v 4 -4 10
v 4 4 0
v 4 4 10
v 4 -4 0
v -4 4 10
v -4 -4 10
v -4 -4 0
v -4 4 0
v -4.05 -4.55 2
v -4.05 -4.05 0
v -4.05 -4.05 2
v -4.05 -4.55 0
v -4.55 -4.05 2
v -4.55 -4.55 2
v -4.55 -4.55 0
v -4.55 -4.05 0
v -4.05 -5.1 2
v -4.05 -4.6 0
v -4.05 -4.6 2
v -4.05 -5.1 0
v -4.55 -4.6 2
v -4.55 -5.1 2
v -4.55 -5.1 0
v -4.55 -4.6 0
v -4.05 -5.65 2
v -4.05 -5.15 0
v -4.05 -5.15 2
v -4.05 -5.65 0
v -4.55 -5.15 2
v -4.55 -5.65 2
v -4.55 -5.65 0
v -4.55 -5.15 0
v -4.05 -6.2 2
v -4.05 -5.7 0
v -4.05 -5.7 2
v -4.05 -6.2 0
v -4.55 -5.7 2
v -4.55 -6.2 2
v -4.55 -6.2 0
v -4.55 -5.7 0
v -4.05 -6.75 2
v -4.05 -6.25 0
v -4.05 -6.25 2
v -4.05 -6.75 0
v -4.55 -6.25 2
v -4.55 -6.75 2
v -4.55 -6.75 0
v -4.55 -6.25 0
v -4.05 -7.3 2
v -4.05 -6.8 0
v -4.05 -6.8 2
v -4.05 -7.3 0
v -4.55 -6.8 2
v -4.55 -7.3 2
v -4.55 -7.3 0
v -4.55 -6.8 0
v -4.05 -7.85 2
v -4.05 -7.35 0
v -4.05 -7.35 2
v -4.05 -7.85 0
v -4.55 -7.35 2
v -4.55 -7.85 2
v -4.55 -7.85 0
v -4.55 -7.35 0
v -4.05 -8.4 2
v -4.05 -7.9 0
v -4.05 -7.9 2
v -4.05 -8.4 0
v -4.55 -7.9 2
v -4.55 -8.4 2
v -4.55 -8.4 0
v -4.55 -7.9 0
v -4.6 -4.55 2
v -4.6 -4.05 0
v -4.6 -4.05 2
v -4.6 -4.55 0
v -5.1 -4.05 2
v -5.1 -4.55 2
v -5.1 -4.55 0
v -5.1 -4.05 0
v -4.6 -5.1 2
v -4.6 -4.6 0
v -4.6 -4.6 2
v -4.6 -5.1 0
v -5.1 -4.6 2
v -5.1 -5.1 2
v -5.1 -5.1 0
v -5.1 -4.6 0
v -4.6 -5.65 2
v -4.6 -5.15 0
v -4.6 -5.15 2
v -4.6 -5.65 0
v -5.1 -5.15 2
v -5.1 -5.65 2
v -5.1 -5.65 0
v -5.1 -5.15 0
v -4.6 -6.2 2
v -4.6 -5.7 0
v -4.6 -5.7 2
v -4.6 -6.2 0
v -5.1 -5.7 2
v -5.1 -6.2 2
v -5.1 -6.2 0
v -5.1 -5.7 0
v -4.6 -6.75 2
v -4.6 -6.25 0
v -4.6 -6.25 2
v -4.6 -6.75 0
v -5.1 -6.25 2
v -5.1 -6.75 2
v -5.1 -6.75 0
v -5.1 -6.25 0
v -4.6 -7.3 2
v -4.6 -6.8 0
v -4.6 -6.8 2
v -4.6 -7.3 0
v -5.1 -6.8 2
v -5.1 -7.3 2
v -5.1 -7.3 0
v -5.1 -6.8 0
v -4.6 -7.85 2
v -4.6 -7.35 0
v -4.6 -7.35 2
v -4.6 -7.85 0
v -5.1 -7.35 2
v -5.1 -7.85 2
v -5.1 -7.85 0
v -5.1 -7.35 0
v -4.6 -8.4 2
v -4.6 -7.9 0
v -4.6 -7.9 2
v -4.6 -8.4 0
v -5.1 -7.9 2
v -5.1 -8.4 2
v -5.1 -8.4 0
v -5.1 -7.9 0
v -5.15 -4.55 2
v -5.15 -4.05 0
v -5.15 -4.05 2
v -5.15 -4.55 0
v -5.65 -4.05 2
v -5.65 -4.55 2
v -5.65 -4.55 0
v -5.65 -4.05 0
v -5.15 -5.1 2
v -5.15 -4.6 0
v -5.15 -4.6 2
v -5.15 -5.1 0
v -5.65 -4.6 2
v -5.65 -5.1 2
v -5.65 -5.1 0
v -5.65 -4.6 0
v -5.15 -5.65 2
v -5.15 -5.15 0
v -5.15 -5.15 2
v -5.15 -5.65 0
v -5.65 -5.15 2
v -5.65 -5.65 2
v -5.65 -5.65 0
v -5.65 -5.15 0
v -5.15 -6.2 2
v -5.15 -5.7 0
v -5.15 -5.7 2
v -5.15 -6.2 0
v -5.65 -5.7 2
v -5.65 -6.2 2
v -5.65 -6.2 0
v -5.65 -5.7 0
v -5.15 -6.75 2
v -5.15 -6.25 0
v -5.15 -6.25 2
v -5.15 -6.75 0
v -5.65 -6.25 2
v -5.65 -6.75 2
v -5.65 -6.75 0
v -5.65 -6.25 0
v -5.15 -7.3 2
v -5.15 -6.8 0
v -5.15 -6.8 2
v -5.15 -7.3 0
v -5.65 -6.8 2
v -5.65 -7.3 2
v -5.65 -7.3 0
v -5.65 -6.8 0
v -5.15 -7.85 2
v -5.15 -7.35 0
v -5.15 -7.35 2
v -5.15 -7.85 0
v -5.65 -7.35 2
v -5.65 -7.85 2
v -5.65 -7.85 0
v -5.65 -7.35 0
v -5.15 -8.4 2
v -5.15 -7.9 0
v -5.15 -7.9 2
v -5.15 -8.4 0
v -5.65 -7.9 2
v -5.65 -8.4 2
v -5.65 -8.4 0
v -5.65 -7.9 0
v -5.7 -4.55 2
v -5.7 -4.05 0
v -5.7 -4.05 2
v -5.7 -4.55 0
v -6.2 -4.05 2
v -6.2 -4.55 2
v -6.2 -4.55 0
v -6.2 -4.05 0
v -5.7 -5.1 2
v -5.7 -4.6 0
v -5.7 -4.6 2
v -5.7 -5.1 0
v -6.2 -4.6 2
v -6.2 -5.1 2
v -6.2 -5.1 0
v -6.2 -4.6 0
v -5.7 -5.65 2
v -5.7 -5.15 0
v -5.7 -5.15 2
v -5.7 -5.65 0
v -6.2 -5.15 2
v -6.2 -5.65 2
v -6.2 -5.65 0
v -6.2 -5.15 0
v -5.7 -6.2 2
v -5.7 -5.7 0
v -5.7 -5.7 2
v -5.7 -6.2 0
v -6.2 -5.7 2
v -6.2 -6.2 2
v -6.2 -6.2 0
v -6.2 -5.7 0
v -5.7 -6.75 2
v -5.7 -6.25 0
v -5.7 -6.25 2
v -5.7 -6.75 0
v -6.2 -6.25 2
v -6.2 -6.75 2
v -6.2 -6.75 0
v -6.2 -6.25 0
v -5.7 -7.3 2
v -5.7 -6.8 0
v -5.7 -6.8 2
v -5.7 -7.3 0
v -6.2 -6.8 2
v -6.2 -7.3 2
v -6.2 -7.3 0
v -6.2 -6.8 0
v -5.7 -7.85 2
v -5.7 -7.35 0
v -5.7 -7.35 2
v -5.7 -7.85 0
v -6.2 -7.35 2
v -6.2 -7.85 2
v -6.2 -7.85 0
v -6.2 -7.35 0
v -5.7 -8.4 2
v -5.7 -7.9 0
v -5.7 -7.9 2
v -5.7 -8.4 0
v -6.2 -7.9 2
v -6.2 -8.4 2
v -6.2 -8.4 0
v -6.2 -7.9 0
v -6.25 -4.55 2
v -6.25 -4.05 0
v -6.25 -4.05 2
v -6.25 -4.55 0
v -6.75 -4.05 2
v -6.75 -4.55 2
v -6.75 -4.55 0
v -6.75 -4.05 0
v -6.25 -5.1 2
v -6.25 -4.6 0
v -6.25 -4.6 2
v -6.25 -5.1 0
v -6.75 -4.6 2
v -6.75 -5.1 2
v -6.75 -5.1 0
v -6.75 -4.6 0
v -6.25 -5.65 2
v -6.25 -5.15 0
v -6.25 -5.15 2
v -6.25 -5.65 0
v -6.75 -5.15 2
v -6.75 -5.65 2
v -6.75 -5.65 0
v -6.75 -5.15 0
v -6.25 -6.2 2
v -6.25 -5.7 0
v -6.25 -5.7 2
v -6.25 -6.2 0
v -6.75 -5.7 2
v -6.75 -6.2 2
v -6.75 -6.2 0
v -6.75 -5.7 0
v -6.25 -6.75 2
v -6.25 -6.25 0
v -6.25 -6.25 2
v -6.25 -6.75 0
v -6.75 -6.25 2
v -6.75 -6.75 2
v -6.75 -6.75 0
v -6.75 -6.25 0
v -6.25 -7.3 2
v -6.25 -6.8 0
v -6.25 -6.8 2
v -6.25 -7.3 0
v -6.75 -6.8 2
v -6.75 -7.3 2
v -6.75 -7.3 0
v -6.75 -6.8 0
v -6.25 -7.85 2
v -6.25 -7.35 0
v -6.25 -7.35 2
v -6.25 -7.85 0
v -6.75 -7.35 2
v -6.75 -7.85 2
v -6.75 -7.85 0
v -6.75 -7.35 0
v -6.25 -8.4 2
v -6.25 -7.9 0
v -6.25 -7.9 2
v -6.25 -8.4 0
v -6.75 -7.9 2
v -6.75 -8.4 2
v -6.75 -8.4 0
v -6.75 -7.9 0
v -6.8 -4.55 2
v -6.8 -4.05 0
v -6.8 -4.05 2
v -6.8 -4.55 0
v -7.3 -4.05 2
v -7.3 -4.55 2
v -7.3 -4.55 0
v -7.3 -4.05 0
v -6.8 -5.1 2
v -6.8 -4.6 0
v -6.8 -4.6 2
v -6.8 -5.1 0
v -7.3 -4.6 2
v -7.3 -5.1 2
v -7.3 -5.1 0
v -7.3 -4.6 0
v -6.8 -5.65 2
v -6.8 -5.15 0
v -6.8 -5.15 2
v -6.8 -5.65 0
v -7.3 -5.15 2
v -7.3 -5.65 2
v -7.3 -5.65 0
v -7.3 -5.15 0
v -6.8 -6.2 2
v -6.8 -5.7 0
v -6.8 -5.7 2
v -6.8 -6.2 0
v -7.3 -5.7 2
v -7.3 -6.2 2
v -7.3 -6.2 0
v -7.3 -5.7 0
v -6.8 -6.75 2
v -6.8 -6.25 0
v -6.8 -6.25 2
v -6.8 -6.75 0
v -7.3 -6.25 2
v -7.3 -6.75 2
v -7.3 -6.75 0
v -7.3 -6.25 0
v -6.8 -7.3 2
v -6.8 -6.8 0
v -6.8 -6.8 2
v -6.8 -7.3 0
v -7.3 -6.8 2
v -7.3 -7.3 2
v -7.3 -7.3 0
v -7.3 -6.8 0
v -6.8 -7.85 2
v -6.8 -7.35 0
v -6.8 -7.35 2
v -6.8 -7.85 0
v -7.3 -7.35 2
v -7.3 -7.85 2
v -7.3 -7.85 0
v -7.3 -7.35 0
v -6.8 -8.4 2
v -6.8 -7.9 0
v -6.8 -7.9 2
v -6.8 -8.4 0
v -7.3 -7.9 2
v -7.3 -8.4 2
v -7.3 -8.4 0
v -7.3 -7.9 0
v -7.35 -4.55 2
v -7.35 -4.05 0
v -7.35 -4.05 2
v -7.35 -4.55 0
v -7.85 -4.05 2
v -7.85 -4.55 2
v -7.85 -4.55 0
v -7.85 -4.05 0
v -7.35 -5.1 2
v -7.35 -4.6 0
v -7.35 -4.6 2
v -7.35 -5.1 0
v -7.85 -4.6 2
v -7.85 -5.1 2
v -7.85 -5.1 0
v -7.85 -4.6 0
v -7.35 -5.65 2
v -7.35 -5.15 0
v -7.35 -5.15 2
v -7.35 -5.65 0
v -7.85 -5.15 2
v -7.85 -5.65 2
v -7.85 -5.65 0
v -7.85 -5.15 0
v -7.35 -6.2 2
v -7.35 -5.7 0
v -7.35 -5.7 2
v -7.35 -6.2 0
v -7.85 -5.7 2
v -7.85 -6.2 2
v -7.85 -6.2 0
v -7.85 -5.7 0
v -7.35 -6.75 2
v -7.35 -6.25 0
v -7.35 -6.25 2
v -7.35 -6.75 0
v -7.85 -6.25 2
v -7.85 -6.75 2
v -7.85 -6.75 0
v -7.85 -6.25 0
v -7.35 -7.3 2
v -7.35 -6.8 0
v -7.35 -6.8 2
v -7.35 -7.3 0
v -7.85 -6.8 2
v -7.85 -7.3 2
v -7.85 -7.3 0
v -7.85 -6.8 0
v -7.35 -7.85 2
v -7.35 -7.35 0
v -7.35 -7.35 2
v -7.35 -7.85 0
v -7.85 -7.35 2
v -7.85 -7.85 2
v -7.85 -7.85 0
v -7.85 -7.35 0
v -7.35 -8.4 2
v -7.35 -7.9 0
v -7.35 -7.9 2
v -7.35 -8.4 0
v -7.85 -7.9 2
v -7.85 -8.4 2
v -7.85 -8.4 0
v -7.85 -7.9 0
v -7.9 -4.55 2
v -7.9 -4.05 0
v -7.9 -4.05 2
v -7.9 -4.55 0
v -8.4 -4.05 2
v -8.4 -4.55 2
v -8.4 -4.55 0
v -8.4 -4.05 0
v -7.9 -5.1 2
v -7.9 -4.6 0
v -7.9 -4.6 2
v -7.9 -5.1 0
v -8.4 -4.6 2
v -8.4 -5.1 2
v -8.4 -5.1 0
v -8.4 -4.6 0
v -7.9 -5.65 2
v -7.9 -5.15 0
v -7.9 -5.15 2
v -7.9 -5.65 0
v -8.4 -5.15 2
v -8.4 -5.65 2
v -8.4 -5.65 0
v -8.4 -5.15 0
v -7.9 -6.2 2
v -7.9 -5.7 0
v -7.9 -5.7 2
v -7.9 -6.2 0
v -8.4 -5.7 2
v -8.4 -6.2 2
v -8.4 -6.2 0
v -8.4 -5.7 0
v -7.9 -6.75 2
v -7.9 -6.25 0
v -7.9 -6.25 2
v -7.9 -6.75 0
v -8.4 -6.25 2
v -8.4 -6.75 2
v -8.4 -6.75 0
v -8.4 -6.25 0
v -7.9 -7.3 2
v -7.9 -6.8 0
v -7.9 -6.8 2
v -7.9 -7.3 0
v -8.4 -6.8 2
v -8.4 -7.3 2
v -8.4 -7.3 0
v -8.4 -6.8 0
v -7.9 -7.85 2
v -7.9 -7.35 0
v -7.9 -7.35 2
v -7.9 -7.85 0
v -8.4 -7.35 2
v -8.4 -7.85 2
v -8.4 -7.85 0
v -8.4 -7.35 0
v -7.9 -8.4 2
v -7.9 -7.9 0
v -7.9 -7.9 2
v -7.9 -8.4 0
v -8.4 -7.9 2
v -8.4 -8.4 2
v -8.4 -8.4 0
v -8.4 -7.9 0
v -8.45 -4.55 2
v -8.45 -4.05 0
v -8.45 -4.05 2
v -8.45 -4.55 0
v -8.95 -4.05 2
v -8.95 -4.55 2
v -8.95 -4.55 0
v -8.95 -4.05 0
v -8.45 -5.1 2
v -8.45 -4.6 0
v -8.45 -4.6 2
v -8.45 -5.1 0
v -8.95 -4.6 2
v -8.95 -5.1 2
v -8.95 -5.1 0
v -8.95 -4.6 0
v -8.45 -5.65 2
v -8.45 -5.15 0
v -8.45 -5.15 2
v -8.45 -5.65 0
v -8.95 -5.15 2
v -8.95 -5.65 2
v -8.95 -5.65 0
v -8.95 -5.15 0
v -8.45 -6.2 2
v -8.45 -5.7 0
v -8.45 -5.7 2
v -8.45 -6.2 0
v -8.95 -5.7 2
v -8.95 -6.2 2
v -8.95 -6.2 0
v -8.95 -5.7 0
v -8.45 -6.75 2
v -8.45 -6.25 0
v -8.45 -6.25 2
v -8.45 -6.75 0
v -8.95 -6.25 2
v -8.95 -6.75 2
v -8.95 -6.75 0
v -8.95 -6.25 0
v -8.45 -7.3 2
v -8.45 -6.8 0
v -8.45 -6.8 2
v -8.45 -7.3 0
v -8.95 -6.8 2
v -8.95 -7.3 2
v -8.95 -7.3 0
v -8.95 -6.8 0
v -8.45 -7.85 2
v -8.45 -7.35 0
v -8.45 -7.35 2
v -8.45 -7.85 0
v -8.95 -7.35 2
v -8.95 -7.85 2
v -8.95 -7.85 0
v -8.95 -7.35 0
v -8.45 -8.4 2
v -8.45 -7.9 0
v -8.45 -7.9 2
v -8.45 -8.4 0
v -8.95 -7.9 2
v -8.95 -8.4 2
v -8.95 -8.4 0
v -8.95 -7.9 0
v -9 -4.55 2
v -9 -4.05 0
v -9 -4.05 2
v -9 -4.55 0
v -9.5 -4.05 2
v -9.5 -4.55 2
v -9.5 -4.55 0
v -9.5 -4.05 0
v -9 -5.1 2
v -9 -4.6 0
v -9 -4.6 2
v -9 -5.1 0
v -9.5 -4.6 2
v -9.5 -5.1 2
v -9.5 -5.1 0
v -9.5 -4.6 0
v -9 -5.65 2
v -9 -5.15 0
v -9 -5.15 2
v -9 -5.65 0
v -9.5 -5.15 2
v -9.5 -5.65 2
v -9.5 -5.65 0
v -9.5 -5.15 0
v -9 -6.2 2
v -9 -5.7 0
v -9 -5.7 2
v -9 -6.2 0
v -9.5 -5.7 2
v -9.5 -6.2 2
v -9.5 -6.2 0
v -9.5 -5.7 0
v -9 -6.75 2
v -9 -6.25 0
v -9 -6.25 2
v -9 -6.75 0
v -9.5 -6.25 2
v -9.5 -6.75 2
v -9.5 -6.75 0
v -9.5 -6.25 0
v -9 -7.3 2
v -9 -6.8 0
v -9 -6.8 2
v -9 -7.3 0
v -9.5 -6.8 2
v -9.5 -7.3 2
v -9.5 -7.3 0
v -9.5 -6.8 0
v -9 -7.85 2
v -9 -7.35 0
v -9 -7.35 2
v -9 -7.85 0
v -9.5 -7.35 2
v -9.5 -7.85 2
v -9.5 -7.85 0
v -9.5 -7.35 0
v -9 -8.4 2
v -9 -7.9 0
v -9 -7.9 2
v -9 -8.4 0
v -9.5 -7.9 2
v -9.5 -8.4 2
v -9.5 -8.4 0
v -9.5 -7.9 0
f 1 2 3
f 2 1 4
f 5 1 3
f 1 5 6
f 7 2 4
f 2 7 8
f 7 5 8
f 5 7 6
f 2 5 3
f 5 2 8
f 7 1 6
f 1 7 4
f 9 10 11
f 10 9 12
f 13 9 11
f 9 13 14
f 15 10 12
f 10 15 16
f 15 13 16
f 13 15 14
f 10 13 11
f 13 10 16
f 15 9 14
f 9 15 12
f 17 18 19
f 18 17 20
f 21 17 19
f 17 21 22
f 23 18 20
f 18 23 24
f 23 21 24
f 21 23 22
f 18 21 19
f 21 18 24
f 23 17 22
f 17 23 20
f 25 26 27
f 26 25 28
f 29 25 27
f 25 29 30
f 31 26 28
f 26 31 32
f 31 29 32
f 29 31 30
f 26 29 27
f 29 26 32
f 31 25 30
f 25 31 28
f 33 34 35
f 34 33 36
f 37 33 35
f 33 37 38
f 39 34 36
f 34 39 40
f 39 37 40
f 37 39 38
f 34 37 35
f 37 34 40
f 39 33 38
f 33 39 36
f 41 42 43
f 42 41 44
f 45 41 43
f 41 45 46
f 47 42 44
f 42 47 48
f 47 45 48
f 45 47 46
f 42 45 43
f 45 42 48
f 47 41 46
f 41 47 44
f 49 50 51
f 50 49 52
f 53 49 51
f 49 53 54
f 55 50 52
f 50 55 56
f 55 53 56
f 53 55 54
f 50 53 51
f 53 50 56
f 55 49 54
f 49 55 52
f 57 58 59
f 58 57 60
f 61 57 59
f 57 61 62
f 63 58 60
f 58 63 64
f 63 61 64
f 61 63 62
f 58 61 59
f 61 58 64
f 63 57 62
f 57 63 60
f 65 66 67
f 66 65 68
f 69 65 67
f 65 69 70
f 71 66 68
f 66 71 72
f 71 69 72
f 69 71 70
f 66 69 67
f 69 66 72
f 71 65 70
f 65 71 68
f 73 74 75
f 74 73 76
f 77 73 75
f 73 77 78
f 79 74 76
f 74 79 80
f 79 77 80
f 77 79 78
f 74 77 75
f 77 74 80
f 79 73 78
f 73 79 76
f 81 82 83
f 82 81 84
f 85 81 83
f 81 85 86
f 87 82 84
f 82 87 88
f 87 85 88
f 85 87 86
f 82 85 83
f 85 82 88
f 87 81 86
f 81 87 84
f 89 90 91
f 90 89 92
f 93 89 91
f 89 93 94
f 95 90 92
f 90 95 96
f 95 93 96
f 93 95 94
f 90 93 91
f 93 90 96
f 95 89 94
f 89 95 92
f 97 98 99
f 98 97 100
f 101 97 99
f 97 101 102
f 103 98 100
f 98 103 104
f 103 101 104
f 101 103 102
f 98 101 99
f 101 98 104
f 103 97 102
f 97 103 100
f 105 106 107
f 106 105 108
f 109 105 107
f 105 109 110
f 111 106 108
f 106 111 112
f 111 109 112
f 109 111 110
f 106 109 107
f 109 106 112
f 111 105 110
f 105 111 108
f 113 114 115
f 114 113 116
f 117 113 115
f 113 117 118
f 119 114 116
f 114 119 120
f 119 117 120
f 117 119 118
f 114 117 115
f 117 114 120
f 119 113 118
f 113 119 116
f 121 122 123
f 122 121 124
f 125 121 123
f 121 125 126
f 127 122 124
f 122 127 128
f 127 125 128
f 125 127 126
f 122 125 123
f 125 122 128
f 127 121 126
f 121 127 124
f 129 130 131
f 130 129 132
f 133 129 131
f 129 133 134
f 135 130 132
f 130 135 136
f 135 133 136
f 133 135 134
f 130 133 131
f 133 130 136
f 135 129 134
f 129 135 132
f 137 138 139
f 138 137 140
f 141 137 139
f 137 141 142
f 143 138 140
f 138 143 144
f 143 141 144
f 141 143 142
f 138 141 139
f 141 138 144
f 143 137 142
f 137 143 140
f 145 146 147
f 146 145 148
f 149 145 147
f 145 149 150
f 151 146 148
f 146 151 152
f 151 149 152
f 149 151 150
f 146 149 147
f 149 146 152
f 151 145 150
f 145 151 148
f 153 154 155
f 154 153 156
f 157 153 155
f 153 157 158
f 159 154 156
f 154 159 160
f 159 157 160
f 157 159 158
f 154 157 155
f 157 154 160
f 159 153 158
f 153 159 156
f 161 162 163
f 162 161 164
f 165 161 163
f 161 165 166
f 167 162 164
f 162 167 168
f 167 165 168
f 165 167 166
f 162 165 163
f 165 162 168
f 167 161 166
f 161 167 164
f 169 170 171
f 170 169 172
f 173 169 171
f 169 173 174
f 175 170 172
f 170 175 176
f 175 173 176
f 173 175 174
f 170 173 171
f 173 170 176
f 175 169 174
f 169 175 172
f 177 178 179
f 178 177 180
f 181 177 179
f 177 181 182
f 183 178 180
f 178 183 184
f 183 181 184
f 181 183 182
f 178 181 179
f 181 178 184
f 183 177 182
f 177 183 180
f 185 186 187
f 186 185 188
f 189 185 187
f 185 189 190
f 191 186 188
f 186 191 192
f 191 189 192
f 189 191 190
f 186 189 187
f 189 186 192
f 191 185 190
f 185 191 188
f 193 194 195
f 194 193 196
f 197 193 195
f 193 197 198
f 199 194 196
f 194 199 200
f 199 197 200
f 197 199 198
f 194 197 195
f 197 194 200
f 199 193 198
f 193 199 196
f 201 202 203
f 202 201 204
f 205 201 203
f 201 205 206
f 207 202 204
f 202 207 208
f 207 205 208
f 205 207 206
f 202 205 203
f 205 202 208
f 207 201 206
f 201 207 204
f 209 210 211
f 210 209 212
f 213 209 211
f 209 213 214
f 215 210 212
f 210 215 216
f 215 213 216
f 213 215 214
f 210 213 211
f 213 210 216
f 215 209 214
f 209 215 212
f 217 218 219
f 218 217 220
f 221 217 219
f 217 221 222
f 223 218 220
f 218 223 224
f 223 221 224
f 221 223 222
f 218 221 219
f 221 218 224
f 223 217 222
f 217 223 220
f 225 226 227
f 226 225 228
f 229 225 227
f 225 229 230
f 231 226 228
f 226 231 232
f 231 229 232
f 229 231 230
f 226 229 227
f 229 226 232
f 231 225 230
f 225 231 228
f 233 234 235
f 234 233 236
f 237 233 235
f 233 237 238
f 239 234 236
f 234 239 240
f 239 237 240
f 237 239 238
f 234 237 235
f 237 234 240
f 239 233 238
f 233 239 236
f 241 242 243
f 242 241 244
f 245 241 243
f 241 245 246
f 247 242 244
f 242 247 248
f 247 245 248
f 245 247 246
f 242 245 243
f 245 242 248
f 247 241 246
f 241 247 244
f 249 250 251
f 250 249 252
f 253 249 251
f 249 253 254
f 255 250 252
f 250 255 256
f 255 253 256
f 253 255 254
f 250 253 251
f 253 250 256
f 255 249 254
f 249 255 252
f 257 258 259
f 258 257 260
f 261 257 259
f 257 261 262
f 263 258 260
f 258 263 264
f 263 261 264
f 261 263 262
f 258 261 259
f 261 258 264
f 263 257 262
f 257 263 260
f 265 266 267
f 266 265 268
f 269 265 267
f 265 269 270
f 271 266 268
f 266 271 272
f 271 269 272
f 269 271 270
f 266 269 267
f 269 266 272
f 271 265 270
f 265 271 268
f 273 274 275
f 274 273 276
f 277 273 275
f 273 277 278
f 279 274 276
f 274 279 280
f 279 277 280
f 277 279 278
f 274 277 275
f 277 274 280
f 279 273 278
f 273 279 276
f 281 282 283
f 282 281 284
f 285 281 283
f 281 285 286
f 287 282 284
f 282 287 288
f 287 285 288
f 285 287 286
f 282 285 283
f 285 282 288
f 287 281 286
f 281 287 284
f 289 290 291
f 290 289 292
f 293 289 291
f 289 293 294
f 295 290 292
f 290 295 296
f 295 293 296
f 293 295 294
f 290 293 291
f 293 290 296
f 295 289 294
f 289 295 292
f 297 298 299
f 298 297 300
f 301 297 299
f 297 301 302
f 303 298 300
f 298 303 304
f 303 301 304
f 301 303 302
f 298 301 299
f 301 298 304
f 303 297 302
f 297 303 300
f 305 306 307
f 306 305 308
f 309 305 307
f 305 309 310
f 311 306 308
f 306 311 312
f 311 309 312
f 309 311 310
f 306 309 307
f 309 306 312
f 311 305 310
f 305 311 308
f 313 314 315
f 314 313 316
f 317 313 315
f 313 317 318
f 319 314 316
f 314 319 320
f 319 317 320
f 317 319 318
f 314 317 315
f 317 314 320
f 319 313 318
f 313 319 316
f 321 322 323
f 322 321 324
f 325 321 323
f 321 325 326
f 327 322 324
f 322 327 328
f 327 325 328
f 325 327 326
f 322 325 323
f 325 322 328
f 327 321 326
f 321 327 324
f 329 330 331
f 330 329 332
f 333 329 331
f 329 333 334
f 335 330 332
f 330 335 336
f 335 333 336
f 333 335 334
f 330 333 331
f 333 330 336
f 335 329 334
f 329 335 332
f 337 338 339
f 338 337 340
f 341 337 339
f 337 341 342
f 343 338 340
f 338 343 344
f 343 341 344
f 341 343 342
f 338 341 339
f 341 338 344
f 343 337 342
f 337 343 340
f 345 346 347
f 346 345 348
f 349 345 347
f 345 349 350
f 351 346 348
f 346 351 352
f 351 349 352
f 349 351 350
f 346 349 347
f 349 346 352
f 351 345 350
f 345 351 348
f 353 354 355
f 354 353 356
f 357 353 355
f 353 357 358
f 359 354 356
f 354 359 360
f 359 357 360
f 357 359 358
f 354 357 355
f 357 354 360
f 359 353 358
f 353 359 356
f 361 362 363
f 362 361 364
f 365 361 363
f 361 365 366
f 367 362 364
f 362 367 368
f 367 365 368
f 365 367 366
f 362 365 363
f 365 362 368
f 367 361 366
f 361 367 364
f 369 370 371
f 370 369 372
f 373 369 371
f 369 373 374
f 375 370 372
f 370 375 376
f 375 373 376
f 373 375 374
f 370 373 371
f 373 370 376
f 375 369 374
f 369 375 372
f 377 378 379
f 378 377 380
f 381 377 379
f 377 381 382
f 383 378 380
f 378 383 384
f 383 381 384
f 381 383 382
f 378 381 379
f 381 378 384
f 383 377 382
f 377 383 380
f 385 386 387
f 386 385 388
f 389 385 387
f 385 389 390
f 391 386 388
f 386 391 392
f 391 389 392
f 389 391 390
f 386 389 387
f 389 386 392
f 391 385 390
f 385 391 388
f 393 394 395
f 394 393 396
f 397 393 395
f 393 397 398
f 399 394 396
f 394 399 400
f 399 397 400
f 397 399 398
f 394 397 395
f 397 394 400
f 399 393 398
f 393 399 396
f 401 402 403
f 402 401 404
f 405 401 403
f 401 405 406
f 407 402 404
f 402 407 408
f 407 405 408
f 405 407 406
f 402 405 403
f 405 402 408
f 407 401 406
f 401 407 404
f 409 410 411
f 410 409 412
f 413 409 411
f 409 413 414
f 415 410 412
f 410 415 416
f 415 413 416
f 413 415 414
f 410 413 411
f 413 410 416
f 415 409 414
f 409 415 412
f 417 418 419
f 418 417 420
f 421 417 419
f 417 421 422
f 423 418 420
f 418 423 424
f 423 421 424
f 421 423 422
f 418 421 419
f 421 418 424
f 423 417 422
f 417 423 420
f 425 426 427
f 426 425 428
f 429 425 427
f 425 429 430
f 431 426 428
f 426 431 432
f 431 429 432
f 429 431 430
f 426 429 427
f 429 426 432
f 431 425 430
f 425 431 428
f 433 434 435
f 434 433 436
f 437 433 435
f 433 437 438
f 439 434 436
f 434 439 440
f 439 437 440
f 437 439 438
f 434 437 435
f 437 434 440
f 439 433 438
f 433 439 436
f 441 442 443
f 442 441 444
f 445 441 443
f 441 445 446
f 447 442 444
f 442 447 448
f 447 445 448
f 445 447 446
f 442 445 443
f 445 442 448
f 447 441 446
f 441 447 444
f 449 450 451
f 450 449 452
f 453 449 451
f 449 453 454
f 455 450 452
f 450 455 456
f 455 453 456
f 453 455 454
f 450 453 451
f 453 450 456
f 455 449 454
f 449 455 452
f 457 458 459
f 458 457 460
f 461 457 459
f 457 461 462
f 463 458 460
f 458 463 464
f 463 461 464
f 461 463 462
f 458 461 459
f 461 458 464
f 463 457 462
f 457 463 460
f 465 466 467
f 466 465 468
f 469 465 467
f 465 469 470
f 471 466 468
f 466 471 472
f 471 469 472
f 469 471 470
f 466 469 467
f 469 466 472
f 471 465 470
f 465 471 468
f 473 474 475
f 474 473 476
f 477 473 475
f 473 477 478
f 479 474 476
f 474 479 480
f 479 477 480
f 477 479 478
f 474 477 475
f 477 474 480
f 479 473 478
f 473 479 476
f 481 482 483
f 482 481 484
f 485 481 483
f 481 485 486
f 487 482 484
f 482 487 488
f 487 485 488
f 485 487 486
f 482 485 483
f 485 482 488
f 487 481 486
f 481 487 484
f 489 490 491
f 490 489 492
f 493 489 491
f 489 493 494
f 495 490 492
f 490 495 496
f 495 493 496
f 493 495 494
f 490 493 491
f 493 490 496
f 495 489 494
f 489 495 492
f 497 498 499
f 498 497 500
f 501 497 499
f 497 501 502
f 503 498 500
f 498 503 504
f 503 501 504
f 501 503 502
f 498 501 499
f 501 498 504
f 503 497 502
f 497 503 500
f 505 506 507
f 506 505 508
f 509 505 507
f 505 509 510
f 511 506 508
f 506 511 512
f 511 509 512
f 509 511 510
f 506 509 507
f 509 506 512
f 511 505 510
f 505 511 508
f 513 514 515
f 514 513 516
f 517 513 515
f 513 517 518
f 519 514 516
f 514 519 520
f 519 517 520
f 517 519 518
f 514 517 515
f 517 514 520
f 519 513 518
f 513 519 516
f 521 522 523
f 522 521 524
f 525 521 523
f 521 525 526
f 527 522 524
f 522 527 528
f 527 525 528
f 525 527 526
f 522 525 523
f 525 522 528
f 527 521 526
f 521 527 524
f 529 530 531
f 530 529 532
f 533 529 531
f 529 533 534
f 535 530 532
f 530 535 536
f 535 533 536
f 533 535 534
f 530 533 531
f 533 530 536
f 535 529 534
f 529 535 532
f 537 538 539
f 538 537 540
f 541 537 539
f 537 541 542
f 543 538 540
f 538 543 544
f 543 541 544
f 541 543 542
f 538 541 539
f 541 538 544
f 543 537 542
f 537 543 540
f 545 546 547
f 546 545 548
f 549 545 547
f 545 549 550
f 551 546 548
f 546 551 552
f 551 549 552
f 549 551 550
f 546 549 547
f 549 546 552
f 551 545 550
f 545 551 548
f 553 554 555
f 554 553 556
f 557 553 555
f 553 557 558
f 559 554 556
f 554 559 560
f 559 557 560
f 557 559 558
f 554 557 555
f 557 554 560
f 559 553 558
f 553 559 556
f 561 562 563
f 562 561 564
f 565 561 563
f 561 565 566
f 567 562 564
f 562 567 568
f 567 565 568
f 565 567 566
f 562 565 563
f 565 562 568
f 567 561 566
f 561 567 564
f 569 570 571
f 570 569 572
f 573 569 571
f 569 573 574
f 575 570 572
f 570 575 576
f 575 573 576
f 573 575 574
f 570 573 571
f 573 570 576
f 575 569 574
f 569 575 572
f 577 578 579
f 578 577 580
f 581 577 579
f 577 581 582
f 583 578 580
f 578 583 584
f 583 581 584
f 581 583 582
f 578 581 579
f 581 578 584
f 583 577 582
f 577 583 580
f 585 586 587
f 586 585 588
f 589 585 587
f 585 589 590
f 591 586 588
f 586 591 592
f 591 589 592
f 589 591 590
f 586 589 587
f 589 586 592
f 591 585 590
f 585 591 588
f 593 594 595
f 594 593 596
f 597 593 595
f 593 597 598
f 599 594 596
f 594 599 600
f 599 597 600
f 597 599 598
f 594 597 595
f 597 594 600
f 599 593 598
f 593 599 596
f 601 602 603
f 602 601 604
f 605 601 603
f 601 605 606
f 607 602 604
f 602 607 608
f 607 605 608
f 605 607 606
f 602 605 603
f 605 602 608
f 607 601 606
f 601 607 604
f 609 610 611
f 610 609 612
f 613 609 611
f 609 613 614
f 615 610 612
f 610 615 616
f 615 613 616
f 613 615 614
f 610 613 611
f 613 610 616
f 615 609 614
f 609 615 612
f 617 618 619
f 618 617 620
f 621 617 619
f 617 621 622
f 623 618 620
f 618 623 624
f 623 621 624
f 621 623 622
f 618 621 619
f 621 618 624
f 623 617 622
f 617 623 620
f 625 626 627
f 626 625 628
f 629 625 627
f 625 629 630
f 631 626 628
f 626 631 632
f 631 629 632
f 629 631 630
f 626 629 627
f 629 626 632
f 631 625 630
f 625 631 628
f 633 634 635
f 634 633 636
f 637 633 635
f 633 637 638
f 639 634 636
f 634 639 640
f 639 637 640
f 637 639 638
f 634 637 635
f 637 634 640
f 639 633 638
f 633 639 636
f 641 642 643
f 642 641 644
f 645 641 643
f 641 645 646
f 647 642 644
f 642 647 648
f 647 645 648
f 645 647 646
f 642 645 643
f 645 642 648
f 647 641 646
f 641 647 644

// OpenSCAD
translate([0, 0, 5]) color([0,1,0,0.9]) cube([8, 8, 10], center=true);
translate([-4.3, -4.3, 1]) color([1,0,0]) cube([0.5, 0.5, 2], center=true);
translate([-4.3, -4.85, 1]) color([1,0,0]) cube([0.5, 0.5, 2], center=true);
translate([-4.3, -5.4, 1]) color([1,0,0]) cube([0.5, 0.5, 2], center=true);
translate([-4.3, -5.95, 1]) color([1,0,0]) cube([0.5, 0.5, 2], center=true);
translate([-4.3, -6.5, 1]) color([1,0,0]) cube([0.5, 0.5, 2], center=true);
translate([-4.3, -7.05, 1]) color([1,0,0]) cube([0.5, 0.5, 2], center=true);
translate([-4.3, -7.6, 1]) color([1,0,0]) cube([0.5, 0.5, 2], center=true);
translate([-4.3, -8.15, 1]) color([1,0,0]) cube([0.5, 0.5, 2], center=true);
translate([-4.85, -4.3, 1]) color([1,0,0]) cube([0.5, 0.5, 2], center=true);
translate([-4.85, -4.85, 1]) color([1,0,0]) cube([0.5, 0.5, 2], center=true);
translate([-4.85, -5.4, 1]) color([1,0,0]) cube([0.5, 0.5, 2], center=true);
translate([-4.85, -5.95, 1]) color([1,0,0]) cube([0.5, 0.5, 2], center=true);
translate([-4.85, -6.5, 1]) color([1,0,0]) cube([0.5, 0.5, 2], center=true);
translate([-4.85, -7.05, 1]) color([1,0,0]) cube([0.5, 0.5, 2], center=true);
translate([-4.85, -7.6, 1]) color([1,0,0]) cube([0.5, 0.5, 2], center=true);
translate([-4.85, -8.15, 1]) color([1,0,0]) cube([0.5, 0.5, 2], center=true);
translate([-5.4, -4.3, 1]) color([1,0,0]) cube([0.5, 0.5, 2], center=true);
translate([-5.4, -4.85, 1]) color([1,0,0]) cube([0.5, 0.5, 2], center=true);
translate([-5.4, -5.4, 1]) color([1,0,0]) cube([0.5, 0.5, 2], center=true);
translate([-5.4, -5.95, 1]) color([1,0,0]) cube([0.5, 0.5, 2], center=true);
translate([-5.4, -6.5, 1]) color([1,0,0]) cube([0.5, 0.5, 2], center=true);
translate([-5.4, -7.05, 1]) color([1,0,0]) cube([0.5, 0.5, 2], center=true);
translate([-5.4, -7.6, 1]) color([1,0,0]) cube([0.5, 0.5, 2], center=true);
translate([-5.4, -8.15, 1]) color([1,0,0]) cube([0.5, 0.5, 2], center=true);
translate([-5.95, -4.3, 1]) color([1,0,0]) cube([0.5, 0.5, 2], center=true);
translate([-5.95, -4.85, 1]) color([1,0,0]) cube([0.5, 0.5, 2], center=true);
translate([-5.95, -5.4, 1]) color([1,0,0]) cube([0.5, 0.5, 2], center=true);
translate([-5.95, -5.95, 1]) color([1,0,0]) cube([0.5, 0.5, 2], center=true);
translate([-5.95, -6.5, 1]) color([1,0,0]) cube([0.5, 0.5, 2], center=true);
translate([-5.95, -7.05, 1]) color([1,0,0]) cube([0.5, 0.5, 2], center=true);
translate([-5.95, -7.6, 1]) color([1,0,0]) cube([0.5, 0.5, 2], center=true);
translate([-5.95, -8.15, 1]) color([1,0,0]) cube([0.5, 0.5, 2], center=true);
translate([-6.5, -4.3, 1]) color([1,0,0]) cube([0.5, 0.5, 2], center=true);
translate([-6.5, -4.85, 1]) color([1,0,0]) cube([0.5, 0.5, 2], center=true);
translate([-6.5, -5.4, 1]) color([1,0,0]) cube([0.5, 0.5, 2], center=true);
translate([-6.5, -5.95, 1]) color([1,0,0]) cube([0.5, 0.5, 2], center=true);
translate([-6.5, -6.5, 1]) color([1,0,0]) cube([0.5, 0.5, 2], center=true);
translate([-6.5, -7.05, 1]) color([1,0,0]) cube([0.5, 0.5, 2], center=true);
translate([-6.5, -7.6, 1]) color([1,0,0]) cube([0.5, 0.5, 2], center=true);
translate([-6.5, -8.15, 1]) color([1,0,0]) cube([0.5, 0.5, 2], center=true);
translate([-7.05, -4.3, 1]) color([1,0,0]) cube([0.5, 0.5, 2], center=true);
translate([-7.05, -4.85, 1]) color([1,0,0]) cube([0.5, 0.5, 2], center=true);
translate([-7.05, -5.4, 1]) color([1,0,0]) cube([0.5, 0.5, 2], center=true);
translate([-7.05, -5.95, 1]) color([1,0,0]) cube([0.5, 0.5, 2], center=true);
translate([-7.05, -6.5, 1]) color([1,0,0]) cube([0.5, 0.5, 2], center=true);
translate([-7.05, -7.05, 1]) color([1,0,0]) cube([0.5, 0.5, 2], center=true);
translate([-7.05, -7.6, 1]) color([1,0,0]) cube([0.5, 0.5, 2], center=true);
translate([-7.05, -8.15, 1]) color([1,0,0]) cube([0.5, 0.5, 2], center=true);
translate([-7.6, -4.3, 1]) color([1,0,0]) cube([0.5, 0.5, 2], center=true);
translate([-7.6, -4.85, 1]) color([1,0,0]) cube([0.5, 0.5, 2], center=true);
translate([-7.6, -5.4, 1]) color([1,0,0]) cube([0.5, 0.5, 2], center=true);
translate([-7.6, -5.95, 1]) color([1,0,0]) cube([0.5, 0.5, 2], center=true);
translate([-7.6, -6.5, 1]) color([1,0,0]) cube([0.5, 0.5, 2], center=true);
translate([-7.6, -7.05, 1]) color([1,0,0]) cube([0.5, 0.5, 2], center=true);
translate([-7.6, -7.6, 1]) color([1,0,0]) cube([0.5, 0.5, 2], center=true);
translate([-7.6, -8.15, 1]) color([1,0,0]) cube([0.5, 0.5, 2], center=true);
translate([-8.15, -4.3, 1]) color([1,0,0]) cube([0.5, 0.5, 2], center=true);
translate([-8.15, -4.85, 1]) color([1,0,0]) cube([0.5, 0.5, 2], center=true);
translate([-8.15, -5.4, 1]) color([1,0,0]) cube([0.5, 0.5, 2], center=true);
translate([-8.15, -5.95, 1]) color([1,0,0]) cube([0.5, 0.5, 2], center=true);
translate([-8.15, -6.5, 1]) color([1,0,0]) cube([0.5, 0.5, 2], center=true);
translate([-8.15, -7.05, 1]) color([1,0,0]) cube([0.5, 0.5, 2], center=true);
translate([-8.15, -7.6, 1]) color([1,0,0]) cube([0.5, 0.5, 2], center=true);
translate([-8.15, -8.15, 1]) color([1,0,0]) cube([0.5, 0.5, 2], center=true);
translate([-8.7, -4.3, 1]) color([1,0,0]) cube([0.5, 0.5, 2], center=true);
translate([-8.7, -4.85, 1]) color([1,0,0]) cube([0.5, 0.5, 2], center=true);
translate([-8.7, -5.4, 1]) color([1,0,0]) cube([0.5, 0.5, 2], center=true);
translate([-8.7, -5.95, 1]) color([1,0,0]) cube([0.5, 0.5, 2], center=true);
translate([-8.7, -6.5, 1]) color([1,0,0]) cube([0.5, 0.5, 2], center=true);
translate([-8.7, -7.05, 1]) color([1,0,0]) cube([0.5, 0.5, 2], center=true);
translate([-8.7, -7.6, 1]) color([1,0,0]) cube([0.5, 0.5, 2], center=true);
translate([-8.7, -8.15, 1]) color([1,0,0]) cube([0.5, 0.5, 2], center=true);
translate([-9.25, -4.3, 1]) color([1,0,0]) cube([0.5, 0.5, 2], center=true);
translate([-9.25, -4.85, 1]) color([1,0,0]) cube([0.5, 0.5, 2], center=true);
translate([-9.25, -5.4, 1]) color([1,0,0]) cube([0.5, 0.5, 2], center=true);
translate([-9.25, -5.95, 1]) color([1,0,0]) cube([0.5, 0.5, 2], center=true);
translate([-9.25, -6.5, 1]) color([1,0,0]) cube([0.5, 0.5, 2], center=true);
translate([-9.25, -7.05, 1]) color([1,0,0]) cube([0.5, 0.5, 2], center=true);
translate([-9.25, -7.6, 1]) color([1,0,0]) cube([0.5, 0.5, 2], center=true);
translate([-9.25, -8.15, 1]) color([1,0,0]) cube([0.5, 0.5, 2], center=true);
